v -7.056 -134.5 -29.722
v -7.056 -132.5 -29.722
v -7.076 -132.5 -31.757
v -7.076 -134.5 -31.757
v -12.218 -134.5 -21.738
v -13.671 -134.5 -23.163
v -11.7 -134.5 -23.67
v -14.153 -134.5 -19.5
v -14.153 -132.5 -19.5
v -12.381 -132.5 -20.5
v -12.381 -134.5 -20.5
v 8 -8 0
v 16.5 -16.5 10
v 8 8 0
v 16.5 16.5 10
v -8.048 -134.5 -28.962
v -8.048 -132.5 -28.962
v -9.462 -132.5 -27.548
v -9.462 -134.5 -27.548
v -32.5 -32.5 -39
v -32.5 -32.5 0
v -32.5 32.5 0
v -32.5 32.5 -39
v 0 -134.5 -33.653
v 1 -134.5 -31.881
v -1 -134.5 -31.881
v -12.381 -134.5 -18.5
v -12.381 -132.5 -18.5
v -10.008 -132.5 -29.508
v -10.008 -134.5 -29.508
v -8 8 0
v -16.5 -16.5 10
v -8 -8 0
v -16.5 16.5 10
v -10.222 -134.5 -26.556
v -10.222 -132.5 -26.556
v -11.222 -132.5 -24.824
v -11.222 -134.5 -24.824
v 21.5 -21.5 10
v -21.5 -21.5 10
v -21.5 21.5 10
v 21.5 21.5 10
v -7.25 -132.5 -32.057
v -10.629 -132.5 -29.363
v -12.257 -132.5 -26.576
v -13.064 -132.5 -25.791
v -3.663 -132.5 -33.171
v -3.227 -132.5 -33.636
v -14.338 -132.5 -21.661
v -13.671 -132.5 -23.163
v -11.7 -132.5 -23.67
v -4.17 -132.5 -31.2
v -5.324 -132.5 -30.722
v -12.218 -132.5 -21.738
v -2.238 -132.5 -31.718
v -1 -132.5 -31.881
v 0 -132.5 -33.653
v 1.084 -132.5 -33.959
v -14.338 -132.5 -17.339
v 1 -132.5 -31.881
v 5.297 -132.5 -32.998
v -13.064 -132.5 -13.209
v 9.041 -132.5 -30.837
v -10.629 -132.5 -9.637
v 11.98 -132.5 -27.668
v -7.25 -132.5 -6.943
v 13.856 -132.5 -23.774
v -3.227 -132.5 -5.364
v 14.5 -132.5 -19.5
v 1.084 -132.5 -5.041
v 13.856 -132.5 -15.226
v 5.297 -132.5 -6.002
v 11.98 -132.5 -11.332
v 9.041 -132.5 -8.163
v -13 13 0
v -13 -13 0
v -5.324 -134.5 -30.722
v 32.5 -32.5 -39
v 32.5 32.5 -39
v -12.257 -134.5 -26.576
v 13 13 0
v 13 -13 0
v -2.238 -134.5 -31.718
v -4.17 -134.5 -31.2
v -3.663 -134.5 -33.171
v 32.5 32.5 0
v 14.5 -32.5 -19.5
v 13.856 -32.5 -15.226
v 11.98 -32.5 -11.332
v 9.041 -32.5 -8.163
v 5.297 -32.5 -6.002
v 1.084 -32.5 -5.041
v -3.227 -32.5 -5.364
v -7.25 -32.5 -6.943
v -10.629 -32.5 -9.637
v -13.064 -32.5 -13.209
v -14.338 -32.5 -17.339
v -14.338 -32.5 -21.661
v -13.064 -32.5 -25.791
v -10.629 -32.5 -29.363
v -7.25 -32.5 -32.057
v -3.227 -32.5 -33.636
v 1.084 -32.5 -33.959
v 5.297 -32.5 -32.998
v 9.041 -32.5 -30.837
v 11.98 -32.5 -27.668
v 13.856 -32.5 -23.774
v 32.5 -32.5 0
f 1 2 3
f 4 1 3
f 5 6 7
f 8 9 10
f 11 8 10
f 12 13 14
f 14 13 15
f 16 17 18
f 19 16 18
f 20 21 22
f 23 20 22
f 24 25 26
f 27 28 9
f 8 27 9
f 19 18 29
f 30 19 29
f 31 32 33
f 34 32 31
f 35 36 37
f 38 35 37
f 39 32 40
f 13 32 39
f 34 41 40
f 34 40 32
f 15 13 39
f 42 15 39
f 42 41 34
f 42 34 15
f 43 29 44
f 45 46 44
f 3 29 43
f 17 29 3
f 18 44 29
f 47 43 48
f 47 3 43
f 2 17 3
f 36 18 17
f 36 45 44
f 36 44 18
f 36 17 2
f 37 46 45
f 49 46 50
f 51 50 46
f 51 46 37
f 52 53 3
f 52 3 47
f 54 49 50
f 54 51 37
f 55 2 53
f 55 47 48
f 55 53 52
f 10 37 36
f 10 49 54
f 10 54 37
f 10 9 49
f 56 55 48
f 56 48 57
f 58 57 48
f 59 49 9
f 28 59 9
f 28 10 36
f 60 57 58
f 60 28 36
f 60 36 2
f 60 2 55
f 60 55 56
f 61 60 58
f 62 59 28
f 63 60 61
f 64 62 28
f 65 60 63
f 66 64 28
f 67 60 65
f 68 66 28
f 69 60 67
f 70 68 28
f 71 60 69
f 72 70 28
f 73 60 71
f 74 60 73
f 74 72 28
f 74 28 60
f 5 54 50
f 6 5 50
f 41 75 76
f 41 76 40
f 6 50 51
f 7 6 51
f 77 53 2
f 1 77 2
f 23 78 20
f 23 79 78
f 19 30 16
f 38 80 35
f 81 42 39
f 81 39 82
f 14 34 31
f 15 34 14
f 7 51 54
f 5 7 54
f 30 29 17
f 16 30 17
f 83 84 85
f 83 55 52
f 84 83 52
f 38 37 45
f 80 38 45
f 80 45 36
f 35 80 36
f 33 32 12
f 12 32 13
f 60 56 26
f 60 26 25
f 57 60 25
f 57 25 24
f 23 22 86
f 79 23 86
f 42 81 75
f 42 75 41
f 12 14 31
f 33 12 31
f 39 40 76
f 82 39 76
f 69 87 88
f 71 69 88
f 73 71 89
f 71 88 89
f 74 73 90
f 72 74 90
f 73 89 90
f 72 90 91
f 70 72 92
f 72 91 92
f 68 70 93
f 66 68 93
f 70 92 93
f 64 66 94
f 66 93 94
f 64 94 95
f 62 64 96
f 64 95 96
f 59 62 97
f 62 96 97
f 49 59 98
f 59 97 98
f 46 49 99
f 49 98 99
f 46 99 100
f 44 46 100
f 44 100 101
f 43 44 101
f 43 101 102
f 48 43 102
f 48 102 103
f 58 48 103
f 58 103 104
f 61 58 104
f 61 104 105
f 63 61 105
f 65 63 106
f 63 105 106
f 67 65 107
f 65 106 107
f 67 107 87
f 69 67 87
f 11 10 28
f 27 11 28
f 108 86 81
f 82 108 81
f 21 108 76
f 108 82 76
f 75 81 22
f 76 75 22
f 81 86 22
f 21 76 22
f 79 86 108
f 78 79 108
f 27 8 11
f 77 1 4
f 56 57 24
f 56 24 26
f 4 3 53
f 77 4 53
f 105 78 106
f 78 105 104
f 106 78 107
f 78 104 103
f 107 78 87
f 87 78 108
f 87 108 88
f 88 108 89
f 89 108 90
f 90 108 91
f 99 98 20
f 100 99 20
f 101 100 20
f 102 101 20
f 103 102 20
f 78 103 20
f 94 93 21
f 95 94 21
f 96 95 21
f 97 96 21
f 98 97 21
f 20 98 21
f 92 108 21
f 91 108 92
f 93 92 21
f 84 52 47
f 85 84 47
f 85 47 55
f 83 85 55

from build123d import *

# Parameters (mm, degrees)
Y_KSEKLIK_EKSTR_ZYON1_DEPTH = 10
IZIM3_W                     = 33
IZIM3_H                     = 33
KES_EKSTR_ZYON1_DEPTH       = 10
KES_EKSTR_ZYON1_DRAFT       = -40.36453657
IZIM7_OUTSIDE_W             = 57.326
IZIM7_OUTSIDE_H             = 24.326
KES_EKSTR_ZYON6_DEPTH       = 56
IZIM10_OUTSIDE_W            = 24.326
IZIM10_OUTSIDE_H            = 57.326
KES_EKSTR_ZYON8_DEPTH       = 28
Y_KSEKLIK_EKSTR_ZYON2_DEPTH = 39
IZIM12_R                    = 14.5
Y_KSEKLIK_EKSTR_ZYON3_DEPTH = 100
Y_KSEKLIK_EKSTR_ZYON4_DEPTH = 2


with BuildPart() as part:
    # Çizim2 → Yükseklik-Ekstrüzyon1 (new body)
    with BuildSketch(Plane.XY):
        Polygon((0, 16.5), (0, 21.5), (-21.5, 21.5), (-21.5, 0), (-16.5, 0), (-16.5, 16.5), align=None)
        Polygon((0, 8), (0, 16.5), (-16.5, 16.5), (-16.5, 0), (-8, 0), (-8, 8), align=None)
        Polygon((-21.5, -21.5), (0, -21.5), (0, -16.5), (-16.5, -16.5), (-16.5, 0), (-21.5, 0), align=None)
        Polygon((-16.5, -16.5), (0, -16.5), (0, -8), (-8, -8), (-8, 0), (-16.5, 0), align=None)
        Polygon((21.5, -21.5), (21.5, 0), (16.5, 0), (16.5, -16.5), (0, -16.5), (0, -21.5), align=None)
        Polygon((16.5, -16.5), (16.5, 0), (8, 0), (8, -8), (0, -8), (0, -16.5), align=None)
        Polygon((8, 0), (16.5, 0), (16.5, 16.5), (0, 16.5), (0, 8), (8, 8), align=None)
        Polygon((16.5, 0), (21.5, 0), (21.5, 21.5), (0, 21.5), (0, 16.5), (16.5, 16.5), align=None)
    extrude(amount=Y_KSEKLIK_EKSTR_ZYON1_DEPTH)


with BuildPart() as kes_ekstr_zyon1_tool:
    # Çizim3 → Kes-Ekstrüzyon1 (with draft: the straight prism first)
    with BuildSketch(Plane.XY.offset(10)):
        Rectangle(IZIM3_W, IZIM3_H)
    extrude(amount=-KES_EKSTR_ZYON1_DEPTH)
    # Kes-Ekstrüzyon1: the draft: its side faces are tilted about the plane it starts from
    kes_ekstr_zyon1_sides = [kes_ekstr_zyon1_tool.faces().sort_by_distance(p)[0] for p in [
        (-16.5, 0, 5),
        (0, -16.5, 5),
        (16.5, 0, 5),
        (0, 16.5, 5),
    ]]
    draft(kes_ekstr_zyon1_sides, Plane.XY.offset(10), KES_EKSTR_ZYON1_DRAFT)


with BuildPart() as part_1:
    add(part.part)

    # Kes-Ekstrüzyon1: cut by kes_ekstr_zyon1_tool
    add(kes_ekstr_zyon1_tool.part, mode=Mode.SUBTRACT)

    # Çizim7 outside → Kes-Ekstrüzyon6 (cut)
    with BuildSketch(Plane(origin=(0, 21.5, 0), x_dir=(1, 0, 0), z_dir=(0, 1, 0))):
        with Locations((0, -5)):
            Rectangle(IZIM7_OUTSIDE_W, IZIM7_OUTSIDE_H)
        Polygon((-21.5, -10), (21.5, -10), (13, 0), (-13, 0), align=None, mode=Mode.SUBTRACT)
    extrude(amount=-KES_EKSTR_ZYON6_DEPTH, mode=Mode.SUBTRACT)

    # Çizim10 outside → Kes-Ekstrüzyon8 (cut, symmetric)
    with BuildSketch(Plane(origin=(0, 0, 0), x_dir=(0, 0, -1), z_dir=(1, 0, 0))):
        with Locations((-5, 0)):
            Rectangle(IZIM10_OUTSIDE_W, IZIM10_OUTSIDE_H)
        Polygon((-10, 21.5), (-10, -21.5), (0, -13), (0, 13), align=None, mode=Mode.SUBTRACT)
    extrude(amount=KES_EKSTR_ZYON8_DEPTH, both=True, mode=Mode.SUBTRACT)

    # Çizim11 → Yükseklik-Ekstrüzyon2 (add)
    with BuildSketch(Plane(origin=(0, 0, 0), x_dir=(-1, 0, 0), z_dir=(0, 0, -1))):
        Polygon((-13, -13), (-32.5, -32.5), (32.5, -32.5), (32.5, 32.5), (13, 13), (13, -13), align=None)
        Polygon((-32.5, 32.5), (-32.5, -32.5), (-13, -13), (-13, 13), (13, 13), (32.5, 32.5), align=None)
        Polygon((-13, 13), (-13, -13), (-8.000000001, -8.000000001), (-8, 8), (8.000000001, 8.000000001), (13, 13), align=None)
        Polygon((-8, 8), (-8.000000001, -8.000000001), (8.000000001, 8.000000001), align=None)
        Polygon((8.000000001, 8.000000001), (-8.000000001, -8.000000001), (8.000000001, -8.000000001), align=None)
        Polygon((-8.000000001, -8.000000001), (-13, -13), (13, -13), (13, 13), (8.000000001, 8.000000001), (8.000000001, -8.000000001), align=None)
    extrude(amount=Y_KSEKLIK_EKSTR_ZYON2_DEPTH)

    # Çizim12 → Yükseklik-Ekstrüzyon3 (add)
    with BuildSketch(Plane.XZ.offset(32.5)):
        with Locations((0, -19.5)):
            Circle(IZIM12_R)
    extrude(amount=Y_KSEKLIK_EKSTR_ZYON3_DEPTH)

    # Çizim13 → Yükseklik-Ekstrüzyon4 (add)
    with BuildSketch(Plane.XZ.offset(132.5)):
        Polygon((-1, -31.880933569), (1, -31.880933569), (0, -33.652876783), align=None)
        Polygon((-3.663034054, -33.170629201), (-2.238495577, -31.717882533), (-4.17034723, -31.200244443), align=None)
        Polygon((-7.076438392, -31.756750831), (-5.324441381, -30.722202993), (-7.056492188, -29.722202993), align=None)
        Polygon((-10.007595147, -29.507595147), (-8.047535303, -28.961748865), (-9.461748865, -27.547535303), align=None)
        Polygon((-12.256750831, -26.576438392), (-10.222202993, -26.556492188), (-11.222202993, -24.824441381), align=None)
        Polygon((-13.670629201, -23.163034054), (-11.700244443, -23.67034723), (-12.217882533, -21.738495578), align=None)
        Polygon((-14.152876783, -19.5), (-12.380933569, -20.5), (-12.380933569, -18.5), align=None)
    extrude(amount=Y_KSEKLIK_EKSTR_ZYON4_DEPTH)


solid = part_1.part
